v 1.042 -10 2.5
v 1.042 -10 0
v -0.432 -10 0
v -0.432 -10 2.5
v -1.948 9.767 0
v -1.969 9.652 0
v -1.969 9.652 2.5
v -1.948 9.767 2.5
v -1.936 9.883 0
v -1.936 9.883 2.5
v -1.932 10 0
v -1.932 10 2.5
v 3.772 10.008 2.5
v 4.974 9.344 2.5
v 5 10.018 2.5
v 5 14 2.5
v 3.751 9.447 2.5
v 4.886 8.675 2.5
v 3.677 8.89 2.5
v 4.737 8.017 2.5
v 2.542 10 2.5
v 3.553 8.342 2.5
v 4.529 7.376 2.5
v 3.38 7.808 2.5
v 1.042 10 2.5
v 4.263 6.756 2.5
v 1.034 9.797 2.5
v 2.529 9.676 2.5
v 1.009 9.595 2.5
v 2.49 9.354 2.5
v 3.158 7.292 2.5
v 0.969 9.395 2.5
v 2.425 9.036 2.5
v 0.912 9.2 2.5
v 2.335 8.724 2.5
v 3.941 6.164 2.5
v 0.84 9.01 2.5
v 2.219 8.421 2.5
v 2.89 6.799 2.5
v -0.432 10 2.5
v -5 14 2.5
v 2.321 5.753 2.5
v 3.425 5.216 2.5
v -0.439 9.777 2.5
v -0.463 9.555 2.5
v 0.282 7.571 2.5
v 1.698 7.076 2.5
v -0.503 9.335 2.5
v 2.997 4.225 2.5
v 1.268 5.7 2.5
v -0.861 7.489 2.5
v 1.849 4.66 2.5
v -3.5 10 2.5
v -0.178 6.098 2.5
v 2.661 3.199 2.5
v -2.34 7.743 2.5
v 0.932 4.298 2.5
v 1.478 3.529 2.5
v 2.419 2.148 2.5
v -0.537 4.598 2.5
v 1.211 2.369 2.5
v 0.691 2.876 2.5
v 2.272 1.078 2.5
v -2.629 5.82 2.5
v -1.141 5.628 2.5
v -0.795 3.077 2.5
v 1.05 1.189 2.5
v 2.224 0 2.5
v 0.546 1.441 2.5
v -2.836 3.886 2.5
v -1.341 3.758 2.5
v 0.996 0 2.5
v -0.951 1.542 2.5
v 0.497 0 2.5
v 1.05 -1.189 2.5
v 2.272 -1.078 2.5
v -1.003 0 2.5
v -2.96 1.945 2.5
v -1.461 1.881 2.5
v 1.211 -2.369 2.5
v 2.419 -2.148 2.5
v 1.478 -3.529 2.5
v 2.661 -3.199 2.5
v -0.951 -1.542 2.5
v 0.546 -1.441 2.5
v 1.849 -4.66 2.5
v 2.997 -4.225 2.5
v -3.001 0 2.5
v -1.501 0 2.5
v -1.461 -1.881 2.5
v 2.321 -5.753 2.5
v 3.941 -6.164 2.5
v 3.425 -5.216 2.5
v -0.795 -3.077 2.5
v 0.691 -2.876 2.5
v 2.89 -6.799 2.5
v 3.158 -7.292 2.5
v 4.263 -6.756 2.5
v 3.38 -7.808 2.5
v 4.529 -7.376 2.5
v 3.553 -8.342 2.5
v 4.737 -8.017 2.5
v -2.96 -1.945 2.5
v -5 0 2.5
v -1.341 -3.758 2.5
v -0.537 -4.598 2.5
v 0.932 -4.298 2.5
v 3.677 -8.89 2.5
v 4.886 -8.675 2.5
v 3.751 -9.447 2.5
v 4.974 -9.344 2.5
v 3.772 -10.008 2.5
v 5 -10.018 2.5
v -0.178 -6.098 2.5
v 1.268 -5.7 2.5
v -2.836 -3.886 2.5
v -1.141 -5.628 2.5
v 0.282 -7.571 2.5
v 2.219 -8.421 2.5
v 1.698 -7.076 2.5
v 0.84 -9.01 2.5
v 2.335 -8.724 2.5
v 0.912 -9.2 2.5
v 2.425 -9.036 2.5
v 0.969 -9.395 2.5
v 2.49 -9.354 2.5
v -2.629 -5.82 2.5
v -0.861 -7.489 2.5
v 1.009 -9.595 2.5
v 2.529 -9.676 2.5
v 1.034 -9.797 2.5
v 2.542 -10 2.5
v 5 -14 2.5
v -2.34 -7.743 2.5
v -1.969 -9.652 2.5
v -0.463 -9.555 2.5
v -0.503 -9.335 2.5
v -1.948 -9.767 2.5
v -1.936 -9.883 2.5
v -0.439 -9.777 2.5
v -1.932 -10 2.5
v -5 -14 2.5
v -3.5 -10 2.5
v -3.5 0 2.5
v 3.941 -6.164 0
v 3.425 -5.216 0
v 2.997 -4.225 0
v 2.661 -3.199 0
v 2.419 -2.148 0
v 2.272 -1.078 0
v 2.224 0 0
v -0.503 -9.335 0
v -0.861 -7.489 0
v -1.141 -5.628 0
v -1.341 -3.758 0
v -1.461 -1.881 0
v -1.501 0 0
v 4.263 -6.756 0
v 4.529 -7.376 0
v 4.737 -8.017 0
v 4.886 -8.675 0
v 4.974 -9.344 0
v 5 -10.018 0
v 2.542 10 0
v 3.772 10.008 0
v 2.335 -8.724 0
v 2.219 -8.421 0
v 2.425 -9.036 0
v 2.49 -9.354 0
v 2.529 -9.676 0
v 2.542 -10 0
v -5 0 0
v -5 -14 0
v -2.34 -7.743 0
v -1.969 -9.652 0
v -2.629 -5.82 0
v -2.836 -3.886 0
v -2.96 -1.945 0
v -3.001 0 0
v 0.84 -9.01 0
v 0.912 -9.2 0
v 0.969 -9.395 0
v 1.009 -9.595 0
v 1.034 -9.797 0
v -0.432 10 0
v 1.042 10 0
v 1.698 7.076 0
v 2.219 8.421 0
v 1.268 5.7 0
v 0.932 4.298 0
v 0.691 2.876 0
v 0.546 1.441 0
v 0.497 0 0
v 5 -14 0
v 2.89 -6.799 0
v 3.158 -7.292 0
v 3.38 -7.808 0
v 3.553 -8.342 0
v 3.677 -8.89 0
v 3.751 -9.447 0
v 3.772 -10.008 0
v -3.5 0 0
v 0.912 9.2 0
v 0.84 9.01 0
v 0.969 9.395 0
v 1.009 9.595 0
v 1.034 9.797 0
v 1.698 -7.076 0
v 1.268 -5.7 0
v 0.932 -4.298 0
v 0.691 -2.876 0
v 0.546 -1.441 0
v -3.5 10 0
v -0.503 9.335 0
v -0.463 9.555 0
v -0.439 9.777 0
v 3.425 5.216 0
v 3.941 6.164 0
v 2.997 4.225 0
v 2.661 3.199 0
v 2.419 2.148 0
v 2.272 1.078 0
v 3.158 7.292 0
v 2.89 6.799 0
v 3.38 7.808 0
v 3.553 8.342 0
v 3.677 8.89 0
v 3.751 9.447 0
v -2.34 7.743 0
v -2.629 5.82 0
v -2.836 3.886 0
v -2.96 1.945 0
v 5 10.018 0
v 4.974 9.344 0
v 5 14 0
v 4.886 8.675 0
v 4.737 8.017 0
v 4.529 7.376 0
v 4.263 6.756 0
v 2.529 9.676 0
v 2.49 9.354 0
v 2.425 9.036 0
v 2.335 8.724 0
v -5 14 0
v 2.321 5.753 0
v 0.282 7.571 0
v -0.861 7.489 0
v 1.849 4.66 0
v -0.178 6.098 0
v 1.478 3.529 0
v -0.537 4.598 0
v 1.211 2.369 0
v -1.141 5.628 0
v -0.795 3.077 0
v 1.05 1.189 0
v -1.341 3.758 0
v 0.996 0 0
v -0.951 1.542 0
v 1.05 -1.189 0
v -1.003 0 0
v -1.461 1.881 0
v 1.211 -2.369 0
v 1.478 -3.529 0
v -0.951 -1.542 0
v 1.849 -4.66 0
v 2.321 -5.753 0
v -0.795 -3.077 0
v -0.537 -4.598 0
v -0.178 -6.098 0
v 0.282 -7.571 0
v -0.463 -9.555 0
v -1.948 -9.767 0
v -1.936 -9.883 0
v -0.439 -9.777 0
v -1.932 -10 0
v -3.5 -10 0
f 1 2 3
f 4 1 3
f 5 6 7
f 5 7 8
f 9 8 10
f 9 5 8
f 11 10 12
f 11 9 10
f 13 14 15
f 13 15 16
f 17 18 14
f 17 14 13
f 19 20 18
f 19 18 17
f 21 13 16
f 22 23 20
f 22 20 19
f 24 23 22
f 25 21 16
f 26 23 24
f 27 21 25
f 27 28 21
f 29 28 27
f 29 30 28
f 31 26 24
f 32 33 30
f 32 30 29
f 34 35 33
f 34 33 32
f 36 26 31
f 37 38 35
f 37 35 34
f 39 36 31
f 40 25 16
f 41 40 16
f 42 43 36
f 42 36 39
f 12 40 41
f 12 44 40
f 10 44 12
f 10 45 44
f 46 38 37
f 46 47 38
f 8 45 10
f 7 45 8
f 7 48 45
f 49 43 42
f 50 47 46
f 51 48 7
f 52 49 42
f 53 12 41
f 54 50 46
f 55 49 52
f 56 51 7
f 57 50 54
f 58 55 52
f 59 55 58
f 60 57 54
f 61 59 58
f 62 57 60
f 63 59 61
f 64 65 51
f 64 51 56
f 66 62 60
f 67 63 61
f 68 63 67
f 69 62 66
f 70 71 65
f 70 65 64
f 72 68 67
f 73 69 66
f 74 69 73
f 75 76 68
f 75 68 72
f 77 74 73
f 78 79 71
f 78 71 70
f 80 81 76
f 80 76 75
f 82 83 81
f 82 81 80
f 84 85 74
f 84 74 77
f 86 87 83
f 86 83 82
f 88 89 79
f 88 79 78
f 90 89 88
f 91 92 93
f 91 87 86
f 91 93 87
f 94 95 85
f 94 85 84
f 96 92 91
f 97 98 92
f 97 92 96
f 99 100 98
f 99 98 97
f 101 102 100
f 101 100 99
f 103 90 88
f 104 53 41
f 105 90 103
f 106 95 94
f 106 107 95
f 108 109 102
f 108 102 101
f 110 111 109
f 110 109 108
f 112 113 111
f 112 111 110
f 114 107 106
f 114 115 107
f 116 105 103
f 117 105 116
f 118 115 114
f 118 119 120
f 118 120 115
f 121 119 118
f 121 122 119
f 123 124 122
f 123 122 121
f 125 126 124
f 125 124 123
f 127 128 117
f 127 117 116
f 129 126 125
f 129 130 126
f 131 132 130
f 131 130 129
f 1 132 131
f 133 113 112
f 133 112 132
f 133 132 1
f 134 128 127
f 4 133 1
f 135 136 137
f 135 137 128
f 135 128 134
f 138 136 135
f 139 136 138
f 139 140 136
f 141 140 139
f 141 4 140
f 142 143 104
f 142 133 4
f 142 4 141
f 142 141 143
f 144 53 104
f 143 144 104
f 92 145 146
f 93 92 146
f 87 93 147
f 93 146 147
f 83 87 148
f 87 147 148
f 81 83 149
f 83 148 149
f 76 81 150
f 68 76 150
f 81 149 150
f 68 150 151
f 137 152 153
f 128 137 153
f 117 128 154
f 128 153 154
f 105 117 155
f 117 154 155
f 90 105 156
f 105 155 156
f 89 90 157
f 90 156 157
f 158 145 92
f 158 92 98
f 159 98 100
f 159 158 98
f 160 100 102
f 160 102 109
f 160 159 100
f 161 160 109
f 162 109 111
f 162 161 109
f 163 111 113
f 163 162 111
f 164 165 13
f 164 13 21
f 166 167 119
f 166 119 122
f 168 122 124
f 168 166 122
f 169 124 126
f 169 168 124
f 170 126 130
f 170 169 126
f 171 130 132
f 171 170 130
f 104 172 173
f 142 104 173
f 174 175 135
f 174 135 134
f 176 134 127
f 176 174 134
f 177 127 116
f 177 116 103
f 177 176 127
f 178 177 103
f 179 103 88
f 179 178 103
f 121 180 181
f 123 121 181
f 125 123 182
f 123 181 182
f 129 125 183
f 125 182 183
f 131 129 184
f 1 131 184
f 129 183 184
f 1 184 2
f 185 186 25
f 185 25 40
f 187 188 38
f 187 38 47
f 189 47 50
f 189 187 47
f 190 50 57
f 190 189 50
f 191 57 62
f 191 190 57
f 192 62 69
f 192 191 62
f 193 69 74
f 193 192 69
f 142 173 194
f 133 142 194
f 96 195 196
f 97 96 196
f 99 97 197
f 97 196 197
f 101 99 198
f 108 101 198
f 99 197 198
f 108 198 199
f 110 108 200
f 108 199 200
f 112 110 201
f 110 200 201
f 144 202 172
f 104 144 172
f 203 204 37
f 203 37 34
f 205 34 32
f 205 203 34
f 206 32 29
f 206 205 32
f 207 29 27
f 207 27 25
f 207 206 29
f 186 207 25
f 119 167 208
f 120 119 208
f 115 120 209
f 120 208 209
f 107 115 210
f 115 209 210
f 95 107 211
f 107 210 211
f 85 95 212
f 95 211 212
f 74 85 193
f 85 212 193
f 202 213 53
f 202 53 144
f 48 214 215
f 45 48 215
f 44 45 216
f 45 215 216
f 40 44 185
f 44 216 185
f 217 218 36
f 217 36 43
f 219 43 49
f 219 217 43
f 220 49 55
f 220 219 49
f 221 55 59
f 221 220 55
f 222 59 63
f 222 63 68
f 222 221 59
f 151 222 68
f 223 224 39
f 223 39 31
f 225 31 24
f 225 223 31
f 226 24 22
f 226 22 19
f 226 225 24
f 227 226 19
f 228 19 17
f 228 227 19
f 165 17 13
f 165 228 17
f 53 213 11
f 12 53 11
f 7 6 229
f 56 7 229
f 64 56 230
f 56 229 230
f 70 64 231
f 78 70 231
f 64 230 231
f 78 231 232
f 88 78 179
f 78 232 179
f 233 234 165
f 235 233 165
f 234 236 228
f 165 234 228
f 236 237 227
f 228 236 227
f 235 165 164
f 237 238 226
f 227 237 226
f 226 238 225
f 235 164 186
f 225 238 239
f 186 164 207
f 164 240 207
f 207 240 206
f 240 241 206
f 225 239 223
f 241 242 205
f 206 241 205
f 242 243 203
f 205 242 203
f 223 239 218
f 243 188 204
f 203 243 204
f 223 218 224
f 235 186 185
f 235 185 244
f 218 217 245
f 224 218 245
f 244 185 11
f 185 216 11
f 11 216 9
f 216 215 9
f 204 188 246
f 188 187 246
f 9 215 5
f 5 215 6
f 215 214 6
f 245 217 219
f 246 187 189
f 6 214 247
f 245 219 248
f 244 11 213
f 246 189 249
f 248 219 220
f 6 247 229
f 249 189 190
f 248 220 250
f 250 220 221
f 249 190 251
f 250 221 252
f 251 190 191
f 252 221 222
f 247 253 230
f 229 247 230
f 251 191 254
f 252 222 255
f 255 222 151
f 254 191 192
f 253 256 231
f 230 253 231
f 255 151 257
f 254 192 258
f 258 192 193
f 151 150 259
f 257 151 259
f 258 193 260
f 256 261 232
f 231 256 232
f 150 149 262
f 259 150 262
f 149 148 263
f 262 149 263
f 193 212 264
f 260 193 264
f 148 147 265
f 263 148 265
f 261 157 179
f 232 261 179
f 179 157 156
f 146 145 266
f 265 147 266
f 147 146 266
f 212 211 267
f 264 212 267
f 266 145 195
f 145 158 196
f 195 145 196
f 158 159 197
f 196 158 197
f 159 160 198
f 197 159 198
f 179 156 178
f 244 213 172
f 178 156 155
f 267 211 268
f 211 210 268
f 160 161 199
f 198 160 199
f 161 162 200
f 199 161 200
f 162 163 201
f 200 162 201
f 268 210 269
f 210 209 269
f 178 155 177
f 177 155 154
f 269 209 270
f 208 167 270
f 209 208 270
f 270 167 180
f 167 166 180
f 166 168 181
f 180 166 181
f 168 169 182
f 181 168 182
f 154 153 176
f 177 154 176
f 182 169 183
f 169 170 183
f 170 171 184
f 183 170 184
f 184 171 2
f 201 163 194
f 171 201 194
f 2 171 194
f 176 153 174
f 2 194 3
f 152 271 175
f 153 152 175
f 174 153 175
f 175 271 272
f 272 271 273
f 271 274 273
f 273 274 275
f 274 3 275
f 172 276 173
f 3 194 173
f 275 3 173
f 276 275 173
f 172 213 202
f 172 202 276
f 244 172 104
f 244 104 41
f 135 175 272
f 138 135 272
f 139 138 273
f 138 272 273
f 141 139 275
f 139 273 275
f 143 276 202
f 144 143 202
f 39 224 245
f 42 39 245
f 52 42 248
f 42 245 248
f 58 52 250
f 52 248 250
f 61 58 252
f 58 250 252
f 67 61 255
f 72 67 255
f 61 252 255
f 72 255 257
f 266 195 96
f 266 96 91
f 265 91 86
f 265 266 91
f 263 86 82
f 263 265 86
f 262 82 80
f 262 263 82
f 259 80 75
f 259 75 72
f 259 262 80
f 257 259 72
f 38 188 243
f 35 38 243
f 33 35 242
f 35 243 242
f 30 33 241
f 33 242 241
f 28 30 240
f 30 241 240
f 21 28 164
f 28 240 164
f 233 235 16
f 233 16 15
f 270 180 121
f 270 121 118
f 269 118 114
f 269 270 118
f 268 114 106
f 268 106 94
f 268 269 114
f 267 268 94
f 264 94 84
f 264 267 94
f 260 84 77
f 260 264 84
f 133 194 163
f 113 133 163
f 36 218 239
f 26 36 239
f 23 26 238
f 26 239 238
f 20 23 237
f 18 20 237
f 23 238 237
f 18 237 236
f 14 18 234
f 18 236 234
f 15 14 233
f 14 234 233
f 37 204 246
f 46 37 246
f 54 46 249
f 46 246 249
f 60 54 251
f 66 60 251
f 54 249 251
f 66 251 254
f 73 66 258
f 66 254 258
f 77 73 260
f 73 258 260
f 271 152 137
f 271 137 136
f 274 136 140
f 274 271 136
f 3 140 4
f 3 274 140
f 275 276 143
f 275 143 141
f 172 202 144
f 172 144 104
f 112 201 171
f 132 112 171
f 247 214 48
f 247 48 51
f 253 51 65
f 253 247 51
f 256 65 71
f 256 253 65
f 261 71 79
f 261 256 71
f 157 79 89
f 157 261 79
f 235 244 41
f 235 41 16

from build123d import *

# Parameters (mm, degrees)
PAD_DEPTH = 2.5


with BuildPart() as part:
    # Sketch → Pad (new body)
    with BuildSketch(Plane.XY):
        with BuildLine():
            Line((-3.5, 1e-05), (-5, 0))
            Line((-5, 0), (-5, 10))
            Line((-5, 10), (-5, 14))
            Line((-5, 14), (5, 14))
            Line((5, 14), (5, 10.017754))
            ThreePointArc((3.940727, 6.163882), (4.737162, 8.017486), (5, 10.017754))
            ThreePointArc((3.940727, 6.163882), (2.660853, 3.199304), (2.223533, 0))
            Line((0.995967, 0), (2.223533, 0))
            ThreePointArc((2.889985, 6.798595), (1.478319, 3.528746), (0.995967, 0))
            ThreePointArc((2.889985, 6.798595), (3.553374, 8.342393), (3.772469, 10.008344))
            Line((3.772469, 10.008344), (2.542243, 10))
            ThreePointArc((2.219305, 8.420788), (2.460682, 9.194053), (2.542243, 10))
            ThreePointArc((2.219305, 8.420788), (0.932219, 4.297526), (0.497311, 0))
            Line((0.497311, 0), (-1.002689, 0))
            ThreePointArc((0.839722, 9.009643), (-0.537369, 4.598047), (-1.002689, 0))
            ThreePointArc((0.839722, 9.009643), (0.991094, 9.494574), (1.042243, 10))
            Line((1.042243, 10), (-0.431539, 10))
            ThreePointArc((-0.502671, 9.335096), (-0.449373, 9.665651), (-0.431539, 10))
            ThreePointArc((-0.502671, 9.335096), (-1.250966, 4.694181), (-1.501344, 0))
            Line((-3.001344, 0), (-1.501344, 0))
            ThreePointArc((-1.968725, 9.652406), (-2.742455, 4.853742), (-3.001344, 0))
            ThreePointArc((-1.968725, 9.652406), (-1.940862, 9.825211), (-1.931539, 10))
            Line((-3.5, 10), (-1.931539, 10))
            Line((-3.5, 10), (-3.5, 1e-05))
        make_face()
    pad = extrude(amount=PAD_DEPTH)

    # Mirrored: Pad across Sketch H_Axis
    add(pad.mirror(Plane.ZX))


solid = part.part
